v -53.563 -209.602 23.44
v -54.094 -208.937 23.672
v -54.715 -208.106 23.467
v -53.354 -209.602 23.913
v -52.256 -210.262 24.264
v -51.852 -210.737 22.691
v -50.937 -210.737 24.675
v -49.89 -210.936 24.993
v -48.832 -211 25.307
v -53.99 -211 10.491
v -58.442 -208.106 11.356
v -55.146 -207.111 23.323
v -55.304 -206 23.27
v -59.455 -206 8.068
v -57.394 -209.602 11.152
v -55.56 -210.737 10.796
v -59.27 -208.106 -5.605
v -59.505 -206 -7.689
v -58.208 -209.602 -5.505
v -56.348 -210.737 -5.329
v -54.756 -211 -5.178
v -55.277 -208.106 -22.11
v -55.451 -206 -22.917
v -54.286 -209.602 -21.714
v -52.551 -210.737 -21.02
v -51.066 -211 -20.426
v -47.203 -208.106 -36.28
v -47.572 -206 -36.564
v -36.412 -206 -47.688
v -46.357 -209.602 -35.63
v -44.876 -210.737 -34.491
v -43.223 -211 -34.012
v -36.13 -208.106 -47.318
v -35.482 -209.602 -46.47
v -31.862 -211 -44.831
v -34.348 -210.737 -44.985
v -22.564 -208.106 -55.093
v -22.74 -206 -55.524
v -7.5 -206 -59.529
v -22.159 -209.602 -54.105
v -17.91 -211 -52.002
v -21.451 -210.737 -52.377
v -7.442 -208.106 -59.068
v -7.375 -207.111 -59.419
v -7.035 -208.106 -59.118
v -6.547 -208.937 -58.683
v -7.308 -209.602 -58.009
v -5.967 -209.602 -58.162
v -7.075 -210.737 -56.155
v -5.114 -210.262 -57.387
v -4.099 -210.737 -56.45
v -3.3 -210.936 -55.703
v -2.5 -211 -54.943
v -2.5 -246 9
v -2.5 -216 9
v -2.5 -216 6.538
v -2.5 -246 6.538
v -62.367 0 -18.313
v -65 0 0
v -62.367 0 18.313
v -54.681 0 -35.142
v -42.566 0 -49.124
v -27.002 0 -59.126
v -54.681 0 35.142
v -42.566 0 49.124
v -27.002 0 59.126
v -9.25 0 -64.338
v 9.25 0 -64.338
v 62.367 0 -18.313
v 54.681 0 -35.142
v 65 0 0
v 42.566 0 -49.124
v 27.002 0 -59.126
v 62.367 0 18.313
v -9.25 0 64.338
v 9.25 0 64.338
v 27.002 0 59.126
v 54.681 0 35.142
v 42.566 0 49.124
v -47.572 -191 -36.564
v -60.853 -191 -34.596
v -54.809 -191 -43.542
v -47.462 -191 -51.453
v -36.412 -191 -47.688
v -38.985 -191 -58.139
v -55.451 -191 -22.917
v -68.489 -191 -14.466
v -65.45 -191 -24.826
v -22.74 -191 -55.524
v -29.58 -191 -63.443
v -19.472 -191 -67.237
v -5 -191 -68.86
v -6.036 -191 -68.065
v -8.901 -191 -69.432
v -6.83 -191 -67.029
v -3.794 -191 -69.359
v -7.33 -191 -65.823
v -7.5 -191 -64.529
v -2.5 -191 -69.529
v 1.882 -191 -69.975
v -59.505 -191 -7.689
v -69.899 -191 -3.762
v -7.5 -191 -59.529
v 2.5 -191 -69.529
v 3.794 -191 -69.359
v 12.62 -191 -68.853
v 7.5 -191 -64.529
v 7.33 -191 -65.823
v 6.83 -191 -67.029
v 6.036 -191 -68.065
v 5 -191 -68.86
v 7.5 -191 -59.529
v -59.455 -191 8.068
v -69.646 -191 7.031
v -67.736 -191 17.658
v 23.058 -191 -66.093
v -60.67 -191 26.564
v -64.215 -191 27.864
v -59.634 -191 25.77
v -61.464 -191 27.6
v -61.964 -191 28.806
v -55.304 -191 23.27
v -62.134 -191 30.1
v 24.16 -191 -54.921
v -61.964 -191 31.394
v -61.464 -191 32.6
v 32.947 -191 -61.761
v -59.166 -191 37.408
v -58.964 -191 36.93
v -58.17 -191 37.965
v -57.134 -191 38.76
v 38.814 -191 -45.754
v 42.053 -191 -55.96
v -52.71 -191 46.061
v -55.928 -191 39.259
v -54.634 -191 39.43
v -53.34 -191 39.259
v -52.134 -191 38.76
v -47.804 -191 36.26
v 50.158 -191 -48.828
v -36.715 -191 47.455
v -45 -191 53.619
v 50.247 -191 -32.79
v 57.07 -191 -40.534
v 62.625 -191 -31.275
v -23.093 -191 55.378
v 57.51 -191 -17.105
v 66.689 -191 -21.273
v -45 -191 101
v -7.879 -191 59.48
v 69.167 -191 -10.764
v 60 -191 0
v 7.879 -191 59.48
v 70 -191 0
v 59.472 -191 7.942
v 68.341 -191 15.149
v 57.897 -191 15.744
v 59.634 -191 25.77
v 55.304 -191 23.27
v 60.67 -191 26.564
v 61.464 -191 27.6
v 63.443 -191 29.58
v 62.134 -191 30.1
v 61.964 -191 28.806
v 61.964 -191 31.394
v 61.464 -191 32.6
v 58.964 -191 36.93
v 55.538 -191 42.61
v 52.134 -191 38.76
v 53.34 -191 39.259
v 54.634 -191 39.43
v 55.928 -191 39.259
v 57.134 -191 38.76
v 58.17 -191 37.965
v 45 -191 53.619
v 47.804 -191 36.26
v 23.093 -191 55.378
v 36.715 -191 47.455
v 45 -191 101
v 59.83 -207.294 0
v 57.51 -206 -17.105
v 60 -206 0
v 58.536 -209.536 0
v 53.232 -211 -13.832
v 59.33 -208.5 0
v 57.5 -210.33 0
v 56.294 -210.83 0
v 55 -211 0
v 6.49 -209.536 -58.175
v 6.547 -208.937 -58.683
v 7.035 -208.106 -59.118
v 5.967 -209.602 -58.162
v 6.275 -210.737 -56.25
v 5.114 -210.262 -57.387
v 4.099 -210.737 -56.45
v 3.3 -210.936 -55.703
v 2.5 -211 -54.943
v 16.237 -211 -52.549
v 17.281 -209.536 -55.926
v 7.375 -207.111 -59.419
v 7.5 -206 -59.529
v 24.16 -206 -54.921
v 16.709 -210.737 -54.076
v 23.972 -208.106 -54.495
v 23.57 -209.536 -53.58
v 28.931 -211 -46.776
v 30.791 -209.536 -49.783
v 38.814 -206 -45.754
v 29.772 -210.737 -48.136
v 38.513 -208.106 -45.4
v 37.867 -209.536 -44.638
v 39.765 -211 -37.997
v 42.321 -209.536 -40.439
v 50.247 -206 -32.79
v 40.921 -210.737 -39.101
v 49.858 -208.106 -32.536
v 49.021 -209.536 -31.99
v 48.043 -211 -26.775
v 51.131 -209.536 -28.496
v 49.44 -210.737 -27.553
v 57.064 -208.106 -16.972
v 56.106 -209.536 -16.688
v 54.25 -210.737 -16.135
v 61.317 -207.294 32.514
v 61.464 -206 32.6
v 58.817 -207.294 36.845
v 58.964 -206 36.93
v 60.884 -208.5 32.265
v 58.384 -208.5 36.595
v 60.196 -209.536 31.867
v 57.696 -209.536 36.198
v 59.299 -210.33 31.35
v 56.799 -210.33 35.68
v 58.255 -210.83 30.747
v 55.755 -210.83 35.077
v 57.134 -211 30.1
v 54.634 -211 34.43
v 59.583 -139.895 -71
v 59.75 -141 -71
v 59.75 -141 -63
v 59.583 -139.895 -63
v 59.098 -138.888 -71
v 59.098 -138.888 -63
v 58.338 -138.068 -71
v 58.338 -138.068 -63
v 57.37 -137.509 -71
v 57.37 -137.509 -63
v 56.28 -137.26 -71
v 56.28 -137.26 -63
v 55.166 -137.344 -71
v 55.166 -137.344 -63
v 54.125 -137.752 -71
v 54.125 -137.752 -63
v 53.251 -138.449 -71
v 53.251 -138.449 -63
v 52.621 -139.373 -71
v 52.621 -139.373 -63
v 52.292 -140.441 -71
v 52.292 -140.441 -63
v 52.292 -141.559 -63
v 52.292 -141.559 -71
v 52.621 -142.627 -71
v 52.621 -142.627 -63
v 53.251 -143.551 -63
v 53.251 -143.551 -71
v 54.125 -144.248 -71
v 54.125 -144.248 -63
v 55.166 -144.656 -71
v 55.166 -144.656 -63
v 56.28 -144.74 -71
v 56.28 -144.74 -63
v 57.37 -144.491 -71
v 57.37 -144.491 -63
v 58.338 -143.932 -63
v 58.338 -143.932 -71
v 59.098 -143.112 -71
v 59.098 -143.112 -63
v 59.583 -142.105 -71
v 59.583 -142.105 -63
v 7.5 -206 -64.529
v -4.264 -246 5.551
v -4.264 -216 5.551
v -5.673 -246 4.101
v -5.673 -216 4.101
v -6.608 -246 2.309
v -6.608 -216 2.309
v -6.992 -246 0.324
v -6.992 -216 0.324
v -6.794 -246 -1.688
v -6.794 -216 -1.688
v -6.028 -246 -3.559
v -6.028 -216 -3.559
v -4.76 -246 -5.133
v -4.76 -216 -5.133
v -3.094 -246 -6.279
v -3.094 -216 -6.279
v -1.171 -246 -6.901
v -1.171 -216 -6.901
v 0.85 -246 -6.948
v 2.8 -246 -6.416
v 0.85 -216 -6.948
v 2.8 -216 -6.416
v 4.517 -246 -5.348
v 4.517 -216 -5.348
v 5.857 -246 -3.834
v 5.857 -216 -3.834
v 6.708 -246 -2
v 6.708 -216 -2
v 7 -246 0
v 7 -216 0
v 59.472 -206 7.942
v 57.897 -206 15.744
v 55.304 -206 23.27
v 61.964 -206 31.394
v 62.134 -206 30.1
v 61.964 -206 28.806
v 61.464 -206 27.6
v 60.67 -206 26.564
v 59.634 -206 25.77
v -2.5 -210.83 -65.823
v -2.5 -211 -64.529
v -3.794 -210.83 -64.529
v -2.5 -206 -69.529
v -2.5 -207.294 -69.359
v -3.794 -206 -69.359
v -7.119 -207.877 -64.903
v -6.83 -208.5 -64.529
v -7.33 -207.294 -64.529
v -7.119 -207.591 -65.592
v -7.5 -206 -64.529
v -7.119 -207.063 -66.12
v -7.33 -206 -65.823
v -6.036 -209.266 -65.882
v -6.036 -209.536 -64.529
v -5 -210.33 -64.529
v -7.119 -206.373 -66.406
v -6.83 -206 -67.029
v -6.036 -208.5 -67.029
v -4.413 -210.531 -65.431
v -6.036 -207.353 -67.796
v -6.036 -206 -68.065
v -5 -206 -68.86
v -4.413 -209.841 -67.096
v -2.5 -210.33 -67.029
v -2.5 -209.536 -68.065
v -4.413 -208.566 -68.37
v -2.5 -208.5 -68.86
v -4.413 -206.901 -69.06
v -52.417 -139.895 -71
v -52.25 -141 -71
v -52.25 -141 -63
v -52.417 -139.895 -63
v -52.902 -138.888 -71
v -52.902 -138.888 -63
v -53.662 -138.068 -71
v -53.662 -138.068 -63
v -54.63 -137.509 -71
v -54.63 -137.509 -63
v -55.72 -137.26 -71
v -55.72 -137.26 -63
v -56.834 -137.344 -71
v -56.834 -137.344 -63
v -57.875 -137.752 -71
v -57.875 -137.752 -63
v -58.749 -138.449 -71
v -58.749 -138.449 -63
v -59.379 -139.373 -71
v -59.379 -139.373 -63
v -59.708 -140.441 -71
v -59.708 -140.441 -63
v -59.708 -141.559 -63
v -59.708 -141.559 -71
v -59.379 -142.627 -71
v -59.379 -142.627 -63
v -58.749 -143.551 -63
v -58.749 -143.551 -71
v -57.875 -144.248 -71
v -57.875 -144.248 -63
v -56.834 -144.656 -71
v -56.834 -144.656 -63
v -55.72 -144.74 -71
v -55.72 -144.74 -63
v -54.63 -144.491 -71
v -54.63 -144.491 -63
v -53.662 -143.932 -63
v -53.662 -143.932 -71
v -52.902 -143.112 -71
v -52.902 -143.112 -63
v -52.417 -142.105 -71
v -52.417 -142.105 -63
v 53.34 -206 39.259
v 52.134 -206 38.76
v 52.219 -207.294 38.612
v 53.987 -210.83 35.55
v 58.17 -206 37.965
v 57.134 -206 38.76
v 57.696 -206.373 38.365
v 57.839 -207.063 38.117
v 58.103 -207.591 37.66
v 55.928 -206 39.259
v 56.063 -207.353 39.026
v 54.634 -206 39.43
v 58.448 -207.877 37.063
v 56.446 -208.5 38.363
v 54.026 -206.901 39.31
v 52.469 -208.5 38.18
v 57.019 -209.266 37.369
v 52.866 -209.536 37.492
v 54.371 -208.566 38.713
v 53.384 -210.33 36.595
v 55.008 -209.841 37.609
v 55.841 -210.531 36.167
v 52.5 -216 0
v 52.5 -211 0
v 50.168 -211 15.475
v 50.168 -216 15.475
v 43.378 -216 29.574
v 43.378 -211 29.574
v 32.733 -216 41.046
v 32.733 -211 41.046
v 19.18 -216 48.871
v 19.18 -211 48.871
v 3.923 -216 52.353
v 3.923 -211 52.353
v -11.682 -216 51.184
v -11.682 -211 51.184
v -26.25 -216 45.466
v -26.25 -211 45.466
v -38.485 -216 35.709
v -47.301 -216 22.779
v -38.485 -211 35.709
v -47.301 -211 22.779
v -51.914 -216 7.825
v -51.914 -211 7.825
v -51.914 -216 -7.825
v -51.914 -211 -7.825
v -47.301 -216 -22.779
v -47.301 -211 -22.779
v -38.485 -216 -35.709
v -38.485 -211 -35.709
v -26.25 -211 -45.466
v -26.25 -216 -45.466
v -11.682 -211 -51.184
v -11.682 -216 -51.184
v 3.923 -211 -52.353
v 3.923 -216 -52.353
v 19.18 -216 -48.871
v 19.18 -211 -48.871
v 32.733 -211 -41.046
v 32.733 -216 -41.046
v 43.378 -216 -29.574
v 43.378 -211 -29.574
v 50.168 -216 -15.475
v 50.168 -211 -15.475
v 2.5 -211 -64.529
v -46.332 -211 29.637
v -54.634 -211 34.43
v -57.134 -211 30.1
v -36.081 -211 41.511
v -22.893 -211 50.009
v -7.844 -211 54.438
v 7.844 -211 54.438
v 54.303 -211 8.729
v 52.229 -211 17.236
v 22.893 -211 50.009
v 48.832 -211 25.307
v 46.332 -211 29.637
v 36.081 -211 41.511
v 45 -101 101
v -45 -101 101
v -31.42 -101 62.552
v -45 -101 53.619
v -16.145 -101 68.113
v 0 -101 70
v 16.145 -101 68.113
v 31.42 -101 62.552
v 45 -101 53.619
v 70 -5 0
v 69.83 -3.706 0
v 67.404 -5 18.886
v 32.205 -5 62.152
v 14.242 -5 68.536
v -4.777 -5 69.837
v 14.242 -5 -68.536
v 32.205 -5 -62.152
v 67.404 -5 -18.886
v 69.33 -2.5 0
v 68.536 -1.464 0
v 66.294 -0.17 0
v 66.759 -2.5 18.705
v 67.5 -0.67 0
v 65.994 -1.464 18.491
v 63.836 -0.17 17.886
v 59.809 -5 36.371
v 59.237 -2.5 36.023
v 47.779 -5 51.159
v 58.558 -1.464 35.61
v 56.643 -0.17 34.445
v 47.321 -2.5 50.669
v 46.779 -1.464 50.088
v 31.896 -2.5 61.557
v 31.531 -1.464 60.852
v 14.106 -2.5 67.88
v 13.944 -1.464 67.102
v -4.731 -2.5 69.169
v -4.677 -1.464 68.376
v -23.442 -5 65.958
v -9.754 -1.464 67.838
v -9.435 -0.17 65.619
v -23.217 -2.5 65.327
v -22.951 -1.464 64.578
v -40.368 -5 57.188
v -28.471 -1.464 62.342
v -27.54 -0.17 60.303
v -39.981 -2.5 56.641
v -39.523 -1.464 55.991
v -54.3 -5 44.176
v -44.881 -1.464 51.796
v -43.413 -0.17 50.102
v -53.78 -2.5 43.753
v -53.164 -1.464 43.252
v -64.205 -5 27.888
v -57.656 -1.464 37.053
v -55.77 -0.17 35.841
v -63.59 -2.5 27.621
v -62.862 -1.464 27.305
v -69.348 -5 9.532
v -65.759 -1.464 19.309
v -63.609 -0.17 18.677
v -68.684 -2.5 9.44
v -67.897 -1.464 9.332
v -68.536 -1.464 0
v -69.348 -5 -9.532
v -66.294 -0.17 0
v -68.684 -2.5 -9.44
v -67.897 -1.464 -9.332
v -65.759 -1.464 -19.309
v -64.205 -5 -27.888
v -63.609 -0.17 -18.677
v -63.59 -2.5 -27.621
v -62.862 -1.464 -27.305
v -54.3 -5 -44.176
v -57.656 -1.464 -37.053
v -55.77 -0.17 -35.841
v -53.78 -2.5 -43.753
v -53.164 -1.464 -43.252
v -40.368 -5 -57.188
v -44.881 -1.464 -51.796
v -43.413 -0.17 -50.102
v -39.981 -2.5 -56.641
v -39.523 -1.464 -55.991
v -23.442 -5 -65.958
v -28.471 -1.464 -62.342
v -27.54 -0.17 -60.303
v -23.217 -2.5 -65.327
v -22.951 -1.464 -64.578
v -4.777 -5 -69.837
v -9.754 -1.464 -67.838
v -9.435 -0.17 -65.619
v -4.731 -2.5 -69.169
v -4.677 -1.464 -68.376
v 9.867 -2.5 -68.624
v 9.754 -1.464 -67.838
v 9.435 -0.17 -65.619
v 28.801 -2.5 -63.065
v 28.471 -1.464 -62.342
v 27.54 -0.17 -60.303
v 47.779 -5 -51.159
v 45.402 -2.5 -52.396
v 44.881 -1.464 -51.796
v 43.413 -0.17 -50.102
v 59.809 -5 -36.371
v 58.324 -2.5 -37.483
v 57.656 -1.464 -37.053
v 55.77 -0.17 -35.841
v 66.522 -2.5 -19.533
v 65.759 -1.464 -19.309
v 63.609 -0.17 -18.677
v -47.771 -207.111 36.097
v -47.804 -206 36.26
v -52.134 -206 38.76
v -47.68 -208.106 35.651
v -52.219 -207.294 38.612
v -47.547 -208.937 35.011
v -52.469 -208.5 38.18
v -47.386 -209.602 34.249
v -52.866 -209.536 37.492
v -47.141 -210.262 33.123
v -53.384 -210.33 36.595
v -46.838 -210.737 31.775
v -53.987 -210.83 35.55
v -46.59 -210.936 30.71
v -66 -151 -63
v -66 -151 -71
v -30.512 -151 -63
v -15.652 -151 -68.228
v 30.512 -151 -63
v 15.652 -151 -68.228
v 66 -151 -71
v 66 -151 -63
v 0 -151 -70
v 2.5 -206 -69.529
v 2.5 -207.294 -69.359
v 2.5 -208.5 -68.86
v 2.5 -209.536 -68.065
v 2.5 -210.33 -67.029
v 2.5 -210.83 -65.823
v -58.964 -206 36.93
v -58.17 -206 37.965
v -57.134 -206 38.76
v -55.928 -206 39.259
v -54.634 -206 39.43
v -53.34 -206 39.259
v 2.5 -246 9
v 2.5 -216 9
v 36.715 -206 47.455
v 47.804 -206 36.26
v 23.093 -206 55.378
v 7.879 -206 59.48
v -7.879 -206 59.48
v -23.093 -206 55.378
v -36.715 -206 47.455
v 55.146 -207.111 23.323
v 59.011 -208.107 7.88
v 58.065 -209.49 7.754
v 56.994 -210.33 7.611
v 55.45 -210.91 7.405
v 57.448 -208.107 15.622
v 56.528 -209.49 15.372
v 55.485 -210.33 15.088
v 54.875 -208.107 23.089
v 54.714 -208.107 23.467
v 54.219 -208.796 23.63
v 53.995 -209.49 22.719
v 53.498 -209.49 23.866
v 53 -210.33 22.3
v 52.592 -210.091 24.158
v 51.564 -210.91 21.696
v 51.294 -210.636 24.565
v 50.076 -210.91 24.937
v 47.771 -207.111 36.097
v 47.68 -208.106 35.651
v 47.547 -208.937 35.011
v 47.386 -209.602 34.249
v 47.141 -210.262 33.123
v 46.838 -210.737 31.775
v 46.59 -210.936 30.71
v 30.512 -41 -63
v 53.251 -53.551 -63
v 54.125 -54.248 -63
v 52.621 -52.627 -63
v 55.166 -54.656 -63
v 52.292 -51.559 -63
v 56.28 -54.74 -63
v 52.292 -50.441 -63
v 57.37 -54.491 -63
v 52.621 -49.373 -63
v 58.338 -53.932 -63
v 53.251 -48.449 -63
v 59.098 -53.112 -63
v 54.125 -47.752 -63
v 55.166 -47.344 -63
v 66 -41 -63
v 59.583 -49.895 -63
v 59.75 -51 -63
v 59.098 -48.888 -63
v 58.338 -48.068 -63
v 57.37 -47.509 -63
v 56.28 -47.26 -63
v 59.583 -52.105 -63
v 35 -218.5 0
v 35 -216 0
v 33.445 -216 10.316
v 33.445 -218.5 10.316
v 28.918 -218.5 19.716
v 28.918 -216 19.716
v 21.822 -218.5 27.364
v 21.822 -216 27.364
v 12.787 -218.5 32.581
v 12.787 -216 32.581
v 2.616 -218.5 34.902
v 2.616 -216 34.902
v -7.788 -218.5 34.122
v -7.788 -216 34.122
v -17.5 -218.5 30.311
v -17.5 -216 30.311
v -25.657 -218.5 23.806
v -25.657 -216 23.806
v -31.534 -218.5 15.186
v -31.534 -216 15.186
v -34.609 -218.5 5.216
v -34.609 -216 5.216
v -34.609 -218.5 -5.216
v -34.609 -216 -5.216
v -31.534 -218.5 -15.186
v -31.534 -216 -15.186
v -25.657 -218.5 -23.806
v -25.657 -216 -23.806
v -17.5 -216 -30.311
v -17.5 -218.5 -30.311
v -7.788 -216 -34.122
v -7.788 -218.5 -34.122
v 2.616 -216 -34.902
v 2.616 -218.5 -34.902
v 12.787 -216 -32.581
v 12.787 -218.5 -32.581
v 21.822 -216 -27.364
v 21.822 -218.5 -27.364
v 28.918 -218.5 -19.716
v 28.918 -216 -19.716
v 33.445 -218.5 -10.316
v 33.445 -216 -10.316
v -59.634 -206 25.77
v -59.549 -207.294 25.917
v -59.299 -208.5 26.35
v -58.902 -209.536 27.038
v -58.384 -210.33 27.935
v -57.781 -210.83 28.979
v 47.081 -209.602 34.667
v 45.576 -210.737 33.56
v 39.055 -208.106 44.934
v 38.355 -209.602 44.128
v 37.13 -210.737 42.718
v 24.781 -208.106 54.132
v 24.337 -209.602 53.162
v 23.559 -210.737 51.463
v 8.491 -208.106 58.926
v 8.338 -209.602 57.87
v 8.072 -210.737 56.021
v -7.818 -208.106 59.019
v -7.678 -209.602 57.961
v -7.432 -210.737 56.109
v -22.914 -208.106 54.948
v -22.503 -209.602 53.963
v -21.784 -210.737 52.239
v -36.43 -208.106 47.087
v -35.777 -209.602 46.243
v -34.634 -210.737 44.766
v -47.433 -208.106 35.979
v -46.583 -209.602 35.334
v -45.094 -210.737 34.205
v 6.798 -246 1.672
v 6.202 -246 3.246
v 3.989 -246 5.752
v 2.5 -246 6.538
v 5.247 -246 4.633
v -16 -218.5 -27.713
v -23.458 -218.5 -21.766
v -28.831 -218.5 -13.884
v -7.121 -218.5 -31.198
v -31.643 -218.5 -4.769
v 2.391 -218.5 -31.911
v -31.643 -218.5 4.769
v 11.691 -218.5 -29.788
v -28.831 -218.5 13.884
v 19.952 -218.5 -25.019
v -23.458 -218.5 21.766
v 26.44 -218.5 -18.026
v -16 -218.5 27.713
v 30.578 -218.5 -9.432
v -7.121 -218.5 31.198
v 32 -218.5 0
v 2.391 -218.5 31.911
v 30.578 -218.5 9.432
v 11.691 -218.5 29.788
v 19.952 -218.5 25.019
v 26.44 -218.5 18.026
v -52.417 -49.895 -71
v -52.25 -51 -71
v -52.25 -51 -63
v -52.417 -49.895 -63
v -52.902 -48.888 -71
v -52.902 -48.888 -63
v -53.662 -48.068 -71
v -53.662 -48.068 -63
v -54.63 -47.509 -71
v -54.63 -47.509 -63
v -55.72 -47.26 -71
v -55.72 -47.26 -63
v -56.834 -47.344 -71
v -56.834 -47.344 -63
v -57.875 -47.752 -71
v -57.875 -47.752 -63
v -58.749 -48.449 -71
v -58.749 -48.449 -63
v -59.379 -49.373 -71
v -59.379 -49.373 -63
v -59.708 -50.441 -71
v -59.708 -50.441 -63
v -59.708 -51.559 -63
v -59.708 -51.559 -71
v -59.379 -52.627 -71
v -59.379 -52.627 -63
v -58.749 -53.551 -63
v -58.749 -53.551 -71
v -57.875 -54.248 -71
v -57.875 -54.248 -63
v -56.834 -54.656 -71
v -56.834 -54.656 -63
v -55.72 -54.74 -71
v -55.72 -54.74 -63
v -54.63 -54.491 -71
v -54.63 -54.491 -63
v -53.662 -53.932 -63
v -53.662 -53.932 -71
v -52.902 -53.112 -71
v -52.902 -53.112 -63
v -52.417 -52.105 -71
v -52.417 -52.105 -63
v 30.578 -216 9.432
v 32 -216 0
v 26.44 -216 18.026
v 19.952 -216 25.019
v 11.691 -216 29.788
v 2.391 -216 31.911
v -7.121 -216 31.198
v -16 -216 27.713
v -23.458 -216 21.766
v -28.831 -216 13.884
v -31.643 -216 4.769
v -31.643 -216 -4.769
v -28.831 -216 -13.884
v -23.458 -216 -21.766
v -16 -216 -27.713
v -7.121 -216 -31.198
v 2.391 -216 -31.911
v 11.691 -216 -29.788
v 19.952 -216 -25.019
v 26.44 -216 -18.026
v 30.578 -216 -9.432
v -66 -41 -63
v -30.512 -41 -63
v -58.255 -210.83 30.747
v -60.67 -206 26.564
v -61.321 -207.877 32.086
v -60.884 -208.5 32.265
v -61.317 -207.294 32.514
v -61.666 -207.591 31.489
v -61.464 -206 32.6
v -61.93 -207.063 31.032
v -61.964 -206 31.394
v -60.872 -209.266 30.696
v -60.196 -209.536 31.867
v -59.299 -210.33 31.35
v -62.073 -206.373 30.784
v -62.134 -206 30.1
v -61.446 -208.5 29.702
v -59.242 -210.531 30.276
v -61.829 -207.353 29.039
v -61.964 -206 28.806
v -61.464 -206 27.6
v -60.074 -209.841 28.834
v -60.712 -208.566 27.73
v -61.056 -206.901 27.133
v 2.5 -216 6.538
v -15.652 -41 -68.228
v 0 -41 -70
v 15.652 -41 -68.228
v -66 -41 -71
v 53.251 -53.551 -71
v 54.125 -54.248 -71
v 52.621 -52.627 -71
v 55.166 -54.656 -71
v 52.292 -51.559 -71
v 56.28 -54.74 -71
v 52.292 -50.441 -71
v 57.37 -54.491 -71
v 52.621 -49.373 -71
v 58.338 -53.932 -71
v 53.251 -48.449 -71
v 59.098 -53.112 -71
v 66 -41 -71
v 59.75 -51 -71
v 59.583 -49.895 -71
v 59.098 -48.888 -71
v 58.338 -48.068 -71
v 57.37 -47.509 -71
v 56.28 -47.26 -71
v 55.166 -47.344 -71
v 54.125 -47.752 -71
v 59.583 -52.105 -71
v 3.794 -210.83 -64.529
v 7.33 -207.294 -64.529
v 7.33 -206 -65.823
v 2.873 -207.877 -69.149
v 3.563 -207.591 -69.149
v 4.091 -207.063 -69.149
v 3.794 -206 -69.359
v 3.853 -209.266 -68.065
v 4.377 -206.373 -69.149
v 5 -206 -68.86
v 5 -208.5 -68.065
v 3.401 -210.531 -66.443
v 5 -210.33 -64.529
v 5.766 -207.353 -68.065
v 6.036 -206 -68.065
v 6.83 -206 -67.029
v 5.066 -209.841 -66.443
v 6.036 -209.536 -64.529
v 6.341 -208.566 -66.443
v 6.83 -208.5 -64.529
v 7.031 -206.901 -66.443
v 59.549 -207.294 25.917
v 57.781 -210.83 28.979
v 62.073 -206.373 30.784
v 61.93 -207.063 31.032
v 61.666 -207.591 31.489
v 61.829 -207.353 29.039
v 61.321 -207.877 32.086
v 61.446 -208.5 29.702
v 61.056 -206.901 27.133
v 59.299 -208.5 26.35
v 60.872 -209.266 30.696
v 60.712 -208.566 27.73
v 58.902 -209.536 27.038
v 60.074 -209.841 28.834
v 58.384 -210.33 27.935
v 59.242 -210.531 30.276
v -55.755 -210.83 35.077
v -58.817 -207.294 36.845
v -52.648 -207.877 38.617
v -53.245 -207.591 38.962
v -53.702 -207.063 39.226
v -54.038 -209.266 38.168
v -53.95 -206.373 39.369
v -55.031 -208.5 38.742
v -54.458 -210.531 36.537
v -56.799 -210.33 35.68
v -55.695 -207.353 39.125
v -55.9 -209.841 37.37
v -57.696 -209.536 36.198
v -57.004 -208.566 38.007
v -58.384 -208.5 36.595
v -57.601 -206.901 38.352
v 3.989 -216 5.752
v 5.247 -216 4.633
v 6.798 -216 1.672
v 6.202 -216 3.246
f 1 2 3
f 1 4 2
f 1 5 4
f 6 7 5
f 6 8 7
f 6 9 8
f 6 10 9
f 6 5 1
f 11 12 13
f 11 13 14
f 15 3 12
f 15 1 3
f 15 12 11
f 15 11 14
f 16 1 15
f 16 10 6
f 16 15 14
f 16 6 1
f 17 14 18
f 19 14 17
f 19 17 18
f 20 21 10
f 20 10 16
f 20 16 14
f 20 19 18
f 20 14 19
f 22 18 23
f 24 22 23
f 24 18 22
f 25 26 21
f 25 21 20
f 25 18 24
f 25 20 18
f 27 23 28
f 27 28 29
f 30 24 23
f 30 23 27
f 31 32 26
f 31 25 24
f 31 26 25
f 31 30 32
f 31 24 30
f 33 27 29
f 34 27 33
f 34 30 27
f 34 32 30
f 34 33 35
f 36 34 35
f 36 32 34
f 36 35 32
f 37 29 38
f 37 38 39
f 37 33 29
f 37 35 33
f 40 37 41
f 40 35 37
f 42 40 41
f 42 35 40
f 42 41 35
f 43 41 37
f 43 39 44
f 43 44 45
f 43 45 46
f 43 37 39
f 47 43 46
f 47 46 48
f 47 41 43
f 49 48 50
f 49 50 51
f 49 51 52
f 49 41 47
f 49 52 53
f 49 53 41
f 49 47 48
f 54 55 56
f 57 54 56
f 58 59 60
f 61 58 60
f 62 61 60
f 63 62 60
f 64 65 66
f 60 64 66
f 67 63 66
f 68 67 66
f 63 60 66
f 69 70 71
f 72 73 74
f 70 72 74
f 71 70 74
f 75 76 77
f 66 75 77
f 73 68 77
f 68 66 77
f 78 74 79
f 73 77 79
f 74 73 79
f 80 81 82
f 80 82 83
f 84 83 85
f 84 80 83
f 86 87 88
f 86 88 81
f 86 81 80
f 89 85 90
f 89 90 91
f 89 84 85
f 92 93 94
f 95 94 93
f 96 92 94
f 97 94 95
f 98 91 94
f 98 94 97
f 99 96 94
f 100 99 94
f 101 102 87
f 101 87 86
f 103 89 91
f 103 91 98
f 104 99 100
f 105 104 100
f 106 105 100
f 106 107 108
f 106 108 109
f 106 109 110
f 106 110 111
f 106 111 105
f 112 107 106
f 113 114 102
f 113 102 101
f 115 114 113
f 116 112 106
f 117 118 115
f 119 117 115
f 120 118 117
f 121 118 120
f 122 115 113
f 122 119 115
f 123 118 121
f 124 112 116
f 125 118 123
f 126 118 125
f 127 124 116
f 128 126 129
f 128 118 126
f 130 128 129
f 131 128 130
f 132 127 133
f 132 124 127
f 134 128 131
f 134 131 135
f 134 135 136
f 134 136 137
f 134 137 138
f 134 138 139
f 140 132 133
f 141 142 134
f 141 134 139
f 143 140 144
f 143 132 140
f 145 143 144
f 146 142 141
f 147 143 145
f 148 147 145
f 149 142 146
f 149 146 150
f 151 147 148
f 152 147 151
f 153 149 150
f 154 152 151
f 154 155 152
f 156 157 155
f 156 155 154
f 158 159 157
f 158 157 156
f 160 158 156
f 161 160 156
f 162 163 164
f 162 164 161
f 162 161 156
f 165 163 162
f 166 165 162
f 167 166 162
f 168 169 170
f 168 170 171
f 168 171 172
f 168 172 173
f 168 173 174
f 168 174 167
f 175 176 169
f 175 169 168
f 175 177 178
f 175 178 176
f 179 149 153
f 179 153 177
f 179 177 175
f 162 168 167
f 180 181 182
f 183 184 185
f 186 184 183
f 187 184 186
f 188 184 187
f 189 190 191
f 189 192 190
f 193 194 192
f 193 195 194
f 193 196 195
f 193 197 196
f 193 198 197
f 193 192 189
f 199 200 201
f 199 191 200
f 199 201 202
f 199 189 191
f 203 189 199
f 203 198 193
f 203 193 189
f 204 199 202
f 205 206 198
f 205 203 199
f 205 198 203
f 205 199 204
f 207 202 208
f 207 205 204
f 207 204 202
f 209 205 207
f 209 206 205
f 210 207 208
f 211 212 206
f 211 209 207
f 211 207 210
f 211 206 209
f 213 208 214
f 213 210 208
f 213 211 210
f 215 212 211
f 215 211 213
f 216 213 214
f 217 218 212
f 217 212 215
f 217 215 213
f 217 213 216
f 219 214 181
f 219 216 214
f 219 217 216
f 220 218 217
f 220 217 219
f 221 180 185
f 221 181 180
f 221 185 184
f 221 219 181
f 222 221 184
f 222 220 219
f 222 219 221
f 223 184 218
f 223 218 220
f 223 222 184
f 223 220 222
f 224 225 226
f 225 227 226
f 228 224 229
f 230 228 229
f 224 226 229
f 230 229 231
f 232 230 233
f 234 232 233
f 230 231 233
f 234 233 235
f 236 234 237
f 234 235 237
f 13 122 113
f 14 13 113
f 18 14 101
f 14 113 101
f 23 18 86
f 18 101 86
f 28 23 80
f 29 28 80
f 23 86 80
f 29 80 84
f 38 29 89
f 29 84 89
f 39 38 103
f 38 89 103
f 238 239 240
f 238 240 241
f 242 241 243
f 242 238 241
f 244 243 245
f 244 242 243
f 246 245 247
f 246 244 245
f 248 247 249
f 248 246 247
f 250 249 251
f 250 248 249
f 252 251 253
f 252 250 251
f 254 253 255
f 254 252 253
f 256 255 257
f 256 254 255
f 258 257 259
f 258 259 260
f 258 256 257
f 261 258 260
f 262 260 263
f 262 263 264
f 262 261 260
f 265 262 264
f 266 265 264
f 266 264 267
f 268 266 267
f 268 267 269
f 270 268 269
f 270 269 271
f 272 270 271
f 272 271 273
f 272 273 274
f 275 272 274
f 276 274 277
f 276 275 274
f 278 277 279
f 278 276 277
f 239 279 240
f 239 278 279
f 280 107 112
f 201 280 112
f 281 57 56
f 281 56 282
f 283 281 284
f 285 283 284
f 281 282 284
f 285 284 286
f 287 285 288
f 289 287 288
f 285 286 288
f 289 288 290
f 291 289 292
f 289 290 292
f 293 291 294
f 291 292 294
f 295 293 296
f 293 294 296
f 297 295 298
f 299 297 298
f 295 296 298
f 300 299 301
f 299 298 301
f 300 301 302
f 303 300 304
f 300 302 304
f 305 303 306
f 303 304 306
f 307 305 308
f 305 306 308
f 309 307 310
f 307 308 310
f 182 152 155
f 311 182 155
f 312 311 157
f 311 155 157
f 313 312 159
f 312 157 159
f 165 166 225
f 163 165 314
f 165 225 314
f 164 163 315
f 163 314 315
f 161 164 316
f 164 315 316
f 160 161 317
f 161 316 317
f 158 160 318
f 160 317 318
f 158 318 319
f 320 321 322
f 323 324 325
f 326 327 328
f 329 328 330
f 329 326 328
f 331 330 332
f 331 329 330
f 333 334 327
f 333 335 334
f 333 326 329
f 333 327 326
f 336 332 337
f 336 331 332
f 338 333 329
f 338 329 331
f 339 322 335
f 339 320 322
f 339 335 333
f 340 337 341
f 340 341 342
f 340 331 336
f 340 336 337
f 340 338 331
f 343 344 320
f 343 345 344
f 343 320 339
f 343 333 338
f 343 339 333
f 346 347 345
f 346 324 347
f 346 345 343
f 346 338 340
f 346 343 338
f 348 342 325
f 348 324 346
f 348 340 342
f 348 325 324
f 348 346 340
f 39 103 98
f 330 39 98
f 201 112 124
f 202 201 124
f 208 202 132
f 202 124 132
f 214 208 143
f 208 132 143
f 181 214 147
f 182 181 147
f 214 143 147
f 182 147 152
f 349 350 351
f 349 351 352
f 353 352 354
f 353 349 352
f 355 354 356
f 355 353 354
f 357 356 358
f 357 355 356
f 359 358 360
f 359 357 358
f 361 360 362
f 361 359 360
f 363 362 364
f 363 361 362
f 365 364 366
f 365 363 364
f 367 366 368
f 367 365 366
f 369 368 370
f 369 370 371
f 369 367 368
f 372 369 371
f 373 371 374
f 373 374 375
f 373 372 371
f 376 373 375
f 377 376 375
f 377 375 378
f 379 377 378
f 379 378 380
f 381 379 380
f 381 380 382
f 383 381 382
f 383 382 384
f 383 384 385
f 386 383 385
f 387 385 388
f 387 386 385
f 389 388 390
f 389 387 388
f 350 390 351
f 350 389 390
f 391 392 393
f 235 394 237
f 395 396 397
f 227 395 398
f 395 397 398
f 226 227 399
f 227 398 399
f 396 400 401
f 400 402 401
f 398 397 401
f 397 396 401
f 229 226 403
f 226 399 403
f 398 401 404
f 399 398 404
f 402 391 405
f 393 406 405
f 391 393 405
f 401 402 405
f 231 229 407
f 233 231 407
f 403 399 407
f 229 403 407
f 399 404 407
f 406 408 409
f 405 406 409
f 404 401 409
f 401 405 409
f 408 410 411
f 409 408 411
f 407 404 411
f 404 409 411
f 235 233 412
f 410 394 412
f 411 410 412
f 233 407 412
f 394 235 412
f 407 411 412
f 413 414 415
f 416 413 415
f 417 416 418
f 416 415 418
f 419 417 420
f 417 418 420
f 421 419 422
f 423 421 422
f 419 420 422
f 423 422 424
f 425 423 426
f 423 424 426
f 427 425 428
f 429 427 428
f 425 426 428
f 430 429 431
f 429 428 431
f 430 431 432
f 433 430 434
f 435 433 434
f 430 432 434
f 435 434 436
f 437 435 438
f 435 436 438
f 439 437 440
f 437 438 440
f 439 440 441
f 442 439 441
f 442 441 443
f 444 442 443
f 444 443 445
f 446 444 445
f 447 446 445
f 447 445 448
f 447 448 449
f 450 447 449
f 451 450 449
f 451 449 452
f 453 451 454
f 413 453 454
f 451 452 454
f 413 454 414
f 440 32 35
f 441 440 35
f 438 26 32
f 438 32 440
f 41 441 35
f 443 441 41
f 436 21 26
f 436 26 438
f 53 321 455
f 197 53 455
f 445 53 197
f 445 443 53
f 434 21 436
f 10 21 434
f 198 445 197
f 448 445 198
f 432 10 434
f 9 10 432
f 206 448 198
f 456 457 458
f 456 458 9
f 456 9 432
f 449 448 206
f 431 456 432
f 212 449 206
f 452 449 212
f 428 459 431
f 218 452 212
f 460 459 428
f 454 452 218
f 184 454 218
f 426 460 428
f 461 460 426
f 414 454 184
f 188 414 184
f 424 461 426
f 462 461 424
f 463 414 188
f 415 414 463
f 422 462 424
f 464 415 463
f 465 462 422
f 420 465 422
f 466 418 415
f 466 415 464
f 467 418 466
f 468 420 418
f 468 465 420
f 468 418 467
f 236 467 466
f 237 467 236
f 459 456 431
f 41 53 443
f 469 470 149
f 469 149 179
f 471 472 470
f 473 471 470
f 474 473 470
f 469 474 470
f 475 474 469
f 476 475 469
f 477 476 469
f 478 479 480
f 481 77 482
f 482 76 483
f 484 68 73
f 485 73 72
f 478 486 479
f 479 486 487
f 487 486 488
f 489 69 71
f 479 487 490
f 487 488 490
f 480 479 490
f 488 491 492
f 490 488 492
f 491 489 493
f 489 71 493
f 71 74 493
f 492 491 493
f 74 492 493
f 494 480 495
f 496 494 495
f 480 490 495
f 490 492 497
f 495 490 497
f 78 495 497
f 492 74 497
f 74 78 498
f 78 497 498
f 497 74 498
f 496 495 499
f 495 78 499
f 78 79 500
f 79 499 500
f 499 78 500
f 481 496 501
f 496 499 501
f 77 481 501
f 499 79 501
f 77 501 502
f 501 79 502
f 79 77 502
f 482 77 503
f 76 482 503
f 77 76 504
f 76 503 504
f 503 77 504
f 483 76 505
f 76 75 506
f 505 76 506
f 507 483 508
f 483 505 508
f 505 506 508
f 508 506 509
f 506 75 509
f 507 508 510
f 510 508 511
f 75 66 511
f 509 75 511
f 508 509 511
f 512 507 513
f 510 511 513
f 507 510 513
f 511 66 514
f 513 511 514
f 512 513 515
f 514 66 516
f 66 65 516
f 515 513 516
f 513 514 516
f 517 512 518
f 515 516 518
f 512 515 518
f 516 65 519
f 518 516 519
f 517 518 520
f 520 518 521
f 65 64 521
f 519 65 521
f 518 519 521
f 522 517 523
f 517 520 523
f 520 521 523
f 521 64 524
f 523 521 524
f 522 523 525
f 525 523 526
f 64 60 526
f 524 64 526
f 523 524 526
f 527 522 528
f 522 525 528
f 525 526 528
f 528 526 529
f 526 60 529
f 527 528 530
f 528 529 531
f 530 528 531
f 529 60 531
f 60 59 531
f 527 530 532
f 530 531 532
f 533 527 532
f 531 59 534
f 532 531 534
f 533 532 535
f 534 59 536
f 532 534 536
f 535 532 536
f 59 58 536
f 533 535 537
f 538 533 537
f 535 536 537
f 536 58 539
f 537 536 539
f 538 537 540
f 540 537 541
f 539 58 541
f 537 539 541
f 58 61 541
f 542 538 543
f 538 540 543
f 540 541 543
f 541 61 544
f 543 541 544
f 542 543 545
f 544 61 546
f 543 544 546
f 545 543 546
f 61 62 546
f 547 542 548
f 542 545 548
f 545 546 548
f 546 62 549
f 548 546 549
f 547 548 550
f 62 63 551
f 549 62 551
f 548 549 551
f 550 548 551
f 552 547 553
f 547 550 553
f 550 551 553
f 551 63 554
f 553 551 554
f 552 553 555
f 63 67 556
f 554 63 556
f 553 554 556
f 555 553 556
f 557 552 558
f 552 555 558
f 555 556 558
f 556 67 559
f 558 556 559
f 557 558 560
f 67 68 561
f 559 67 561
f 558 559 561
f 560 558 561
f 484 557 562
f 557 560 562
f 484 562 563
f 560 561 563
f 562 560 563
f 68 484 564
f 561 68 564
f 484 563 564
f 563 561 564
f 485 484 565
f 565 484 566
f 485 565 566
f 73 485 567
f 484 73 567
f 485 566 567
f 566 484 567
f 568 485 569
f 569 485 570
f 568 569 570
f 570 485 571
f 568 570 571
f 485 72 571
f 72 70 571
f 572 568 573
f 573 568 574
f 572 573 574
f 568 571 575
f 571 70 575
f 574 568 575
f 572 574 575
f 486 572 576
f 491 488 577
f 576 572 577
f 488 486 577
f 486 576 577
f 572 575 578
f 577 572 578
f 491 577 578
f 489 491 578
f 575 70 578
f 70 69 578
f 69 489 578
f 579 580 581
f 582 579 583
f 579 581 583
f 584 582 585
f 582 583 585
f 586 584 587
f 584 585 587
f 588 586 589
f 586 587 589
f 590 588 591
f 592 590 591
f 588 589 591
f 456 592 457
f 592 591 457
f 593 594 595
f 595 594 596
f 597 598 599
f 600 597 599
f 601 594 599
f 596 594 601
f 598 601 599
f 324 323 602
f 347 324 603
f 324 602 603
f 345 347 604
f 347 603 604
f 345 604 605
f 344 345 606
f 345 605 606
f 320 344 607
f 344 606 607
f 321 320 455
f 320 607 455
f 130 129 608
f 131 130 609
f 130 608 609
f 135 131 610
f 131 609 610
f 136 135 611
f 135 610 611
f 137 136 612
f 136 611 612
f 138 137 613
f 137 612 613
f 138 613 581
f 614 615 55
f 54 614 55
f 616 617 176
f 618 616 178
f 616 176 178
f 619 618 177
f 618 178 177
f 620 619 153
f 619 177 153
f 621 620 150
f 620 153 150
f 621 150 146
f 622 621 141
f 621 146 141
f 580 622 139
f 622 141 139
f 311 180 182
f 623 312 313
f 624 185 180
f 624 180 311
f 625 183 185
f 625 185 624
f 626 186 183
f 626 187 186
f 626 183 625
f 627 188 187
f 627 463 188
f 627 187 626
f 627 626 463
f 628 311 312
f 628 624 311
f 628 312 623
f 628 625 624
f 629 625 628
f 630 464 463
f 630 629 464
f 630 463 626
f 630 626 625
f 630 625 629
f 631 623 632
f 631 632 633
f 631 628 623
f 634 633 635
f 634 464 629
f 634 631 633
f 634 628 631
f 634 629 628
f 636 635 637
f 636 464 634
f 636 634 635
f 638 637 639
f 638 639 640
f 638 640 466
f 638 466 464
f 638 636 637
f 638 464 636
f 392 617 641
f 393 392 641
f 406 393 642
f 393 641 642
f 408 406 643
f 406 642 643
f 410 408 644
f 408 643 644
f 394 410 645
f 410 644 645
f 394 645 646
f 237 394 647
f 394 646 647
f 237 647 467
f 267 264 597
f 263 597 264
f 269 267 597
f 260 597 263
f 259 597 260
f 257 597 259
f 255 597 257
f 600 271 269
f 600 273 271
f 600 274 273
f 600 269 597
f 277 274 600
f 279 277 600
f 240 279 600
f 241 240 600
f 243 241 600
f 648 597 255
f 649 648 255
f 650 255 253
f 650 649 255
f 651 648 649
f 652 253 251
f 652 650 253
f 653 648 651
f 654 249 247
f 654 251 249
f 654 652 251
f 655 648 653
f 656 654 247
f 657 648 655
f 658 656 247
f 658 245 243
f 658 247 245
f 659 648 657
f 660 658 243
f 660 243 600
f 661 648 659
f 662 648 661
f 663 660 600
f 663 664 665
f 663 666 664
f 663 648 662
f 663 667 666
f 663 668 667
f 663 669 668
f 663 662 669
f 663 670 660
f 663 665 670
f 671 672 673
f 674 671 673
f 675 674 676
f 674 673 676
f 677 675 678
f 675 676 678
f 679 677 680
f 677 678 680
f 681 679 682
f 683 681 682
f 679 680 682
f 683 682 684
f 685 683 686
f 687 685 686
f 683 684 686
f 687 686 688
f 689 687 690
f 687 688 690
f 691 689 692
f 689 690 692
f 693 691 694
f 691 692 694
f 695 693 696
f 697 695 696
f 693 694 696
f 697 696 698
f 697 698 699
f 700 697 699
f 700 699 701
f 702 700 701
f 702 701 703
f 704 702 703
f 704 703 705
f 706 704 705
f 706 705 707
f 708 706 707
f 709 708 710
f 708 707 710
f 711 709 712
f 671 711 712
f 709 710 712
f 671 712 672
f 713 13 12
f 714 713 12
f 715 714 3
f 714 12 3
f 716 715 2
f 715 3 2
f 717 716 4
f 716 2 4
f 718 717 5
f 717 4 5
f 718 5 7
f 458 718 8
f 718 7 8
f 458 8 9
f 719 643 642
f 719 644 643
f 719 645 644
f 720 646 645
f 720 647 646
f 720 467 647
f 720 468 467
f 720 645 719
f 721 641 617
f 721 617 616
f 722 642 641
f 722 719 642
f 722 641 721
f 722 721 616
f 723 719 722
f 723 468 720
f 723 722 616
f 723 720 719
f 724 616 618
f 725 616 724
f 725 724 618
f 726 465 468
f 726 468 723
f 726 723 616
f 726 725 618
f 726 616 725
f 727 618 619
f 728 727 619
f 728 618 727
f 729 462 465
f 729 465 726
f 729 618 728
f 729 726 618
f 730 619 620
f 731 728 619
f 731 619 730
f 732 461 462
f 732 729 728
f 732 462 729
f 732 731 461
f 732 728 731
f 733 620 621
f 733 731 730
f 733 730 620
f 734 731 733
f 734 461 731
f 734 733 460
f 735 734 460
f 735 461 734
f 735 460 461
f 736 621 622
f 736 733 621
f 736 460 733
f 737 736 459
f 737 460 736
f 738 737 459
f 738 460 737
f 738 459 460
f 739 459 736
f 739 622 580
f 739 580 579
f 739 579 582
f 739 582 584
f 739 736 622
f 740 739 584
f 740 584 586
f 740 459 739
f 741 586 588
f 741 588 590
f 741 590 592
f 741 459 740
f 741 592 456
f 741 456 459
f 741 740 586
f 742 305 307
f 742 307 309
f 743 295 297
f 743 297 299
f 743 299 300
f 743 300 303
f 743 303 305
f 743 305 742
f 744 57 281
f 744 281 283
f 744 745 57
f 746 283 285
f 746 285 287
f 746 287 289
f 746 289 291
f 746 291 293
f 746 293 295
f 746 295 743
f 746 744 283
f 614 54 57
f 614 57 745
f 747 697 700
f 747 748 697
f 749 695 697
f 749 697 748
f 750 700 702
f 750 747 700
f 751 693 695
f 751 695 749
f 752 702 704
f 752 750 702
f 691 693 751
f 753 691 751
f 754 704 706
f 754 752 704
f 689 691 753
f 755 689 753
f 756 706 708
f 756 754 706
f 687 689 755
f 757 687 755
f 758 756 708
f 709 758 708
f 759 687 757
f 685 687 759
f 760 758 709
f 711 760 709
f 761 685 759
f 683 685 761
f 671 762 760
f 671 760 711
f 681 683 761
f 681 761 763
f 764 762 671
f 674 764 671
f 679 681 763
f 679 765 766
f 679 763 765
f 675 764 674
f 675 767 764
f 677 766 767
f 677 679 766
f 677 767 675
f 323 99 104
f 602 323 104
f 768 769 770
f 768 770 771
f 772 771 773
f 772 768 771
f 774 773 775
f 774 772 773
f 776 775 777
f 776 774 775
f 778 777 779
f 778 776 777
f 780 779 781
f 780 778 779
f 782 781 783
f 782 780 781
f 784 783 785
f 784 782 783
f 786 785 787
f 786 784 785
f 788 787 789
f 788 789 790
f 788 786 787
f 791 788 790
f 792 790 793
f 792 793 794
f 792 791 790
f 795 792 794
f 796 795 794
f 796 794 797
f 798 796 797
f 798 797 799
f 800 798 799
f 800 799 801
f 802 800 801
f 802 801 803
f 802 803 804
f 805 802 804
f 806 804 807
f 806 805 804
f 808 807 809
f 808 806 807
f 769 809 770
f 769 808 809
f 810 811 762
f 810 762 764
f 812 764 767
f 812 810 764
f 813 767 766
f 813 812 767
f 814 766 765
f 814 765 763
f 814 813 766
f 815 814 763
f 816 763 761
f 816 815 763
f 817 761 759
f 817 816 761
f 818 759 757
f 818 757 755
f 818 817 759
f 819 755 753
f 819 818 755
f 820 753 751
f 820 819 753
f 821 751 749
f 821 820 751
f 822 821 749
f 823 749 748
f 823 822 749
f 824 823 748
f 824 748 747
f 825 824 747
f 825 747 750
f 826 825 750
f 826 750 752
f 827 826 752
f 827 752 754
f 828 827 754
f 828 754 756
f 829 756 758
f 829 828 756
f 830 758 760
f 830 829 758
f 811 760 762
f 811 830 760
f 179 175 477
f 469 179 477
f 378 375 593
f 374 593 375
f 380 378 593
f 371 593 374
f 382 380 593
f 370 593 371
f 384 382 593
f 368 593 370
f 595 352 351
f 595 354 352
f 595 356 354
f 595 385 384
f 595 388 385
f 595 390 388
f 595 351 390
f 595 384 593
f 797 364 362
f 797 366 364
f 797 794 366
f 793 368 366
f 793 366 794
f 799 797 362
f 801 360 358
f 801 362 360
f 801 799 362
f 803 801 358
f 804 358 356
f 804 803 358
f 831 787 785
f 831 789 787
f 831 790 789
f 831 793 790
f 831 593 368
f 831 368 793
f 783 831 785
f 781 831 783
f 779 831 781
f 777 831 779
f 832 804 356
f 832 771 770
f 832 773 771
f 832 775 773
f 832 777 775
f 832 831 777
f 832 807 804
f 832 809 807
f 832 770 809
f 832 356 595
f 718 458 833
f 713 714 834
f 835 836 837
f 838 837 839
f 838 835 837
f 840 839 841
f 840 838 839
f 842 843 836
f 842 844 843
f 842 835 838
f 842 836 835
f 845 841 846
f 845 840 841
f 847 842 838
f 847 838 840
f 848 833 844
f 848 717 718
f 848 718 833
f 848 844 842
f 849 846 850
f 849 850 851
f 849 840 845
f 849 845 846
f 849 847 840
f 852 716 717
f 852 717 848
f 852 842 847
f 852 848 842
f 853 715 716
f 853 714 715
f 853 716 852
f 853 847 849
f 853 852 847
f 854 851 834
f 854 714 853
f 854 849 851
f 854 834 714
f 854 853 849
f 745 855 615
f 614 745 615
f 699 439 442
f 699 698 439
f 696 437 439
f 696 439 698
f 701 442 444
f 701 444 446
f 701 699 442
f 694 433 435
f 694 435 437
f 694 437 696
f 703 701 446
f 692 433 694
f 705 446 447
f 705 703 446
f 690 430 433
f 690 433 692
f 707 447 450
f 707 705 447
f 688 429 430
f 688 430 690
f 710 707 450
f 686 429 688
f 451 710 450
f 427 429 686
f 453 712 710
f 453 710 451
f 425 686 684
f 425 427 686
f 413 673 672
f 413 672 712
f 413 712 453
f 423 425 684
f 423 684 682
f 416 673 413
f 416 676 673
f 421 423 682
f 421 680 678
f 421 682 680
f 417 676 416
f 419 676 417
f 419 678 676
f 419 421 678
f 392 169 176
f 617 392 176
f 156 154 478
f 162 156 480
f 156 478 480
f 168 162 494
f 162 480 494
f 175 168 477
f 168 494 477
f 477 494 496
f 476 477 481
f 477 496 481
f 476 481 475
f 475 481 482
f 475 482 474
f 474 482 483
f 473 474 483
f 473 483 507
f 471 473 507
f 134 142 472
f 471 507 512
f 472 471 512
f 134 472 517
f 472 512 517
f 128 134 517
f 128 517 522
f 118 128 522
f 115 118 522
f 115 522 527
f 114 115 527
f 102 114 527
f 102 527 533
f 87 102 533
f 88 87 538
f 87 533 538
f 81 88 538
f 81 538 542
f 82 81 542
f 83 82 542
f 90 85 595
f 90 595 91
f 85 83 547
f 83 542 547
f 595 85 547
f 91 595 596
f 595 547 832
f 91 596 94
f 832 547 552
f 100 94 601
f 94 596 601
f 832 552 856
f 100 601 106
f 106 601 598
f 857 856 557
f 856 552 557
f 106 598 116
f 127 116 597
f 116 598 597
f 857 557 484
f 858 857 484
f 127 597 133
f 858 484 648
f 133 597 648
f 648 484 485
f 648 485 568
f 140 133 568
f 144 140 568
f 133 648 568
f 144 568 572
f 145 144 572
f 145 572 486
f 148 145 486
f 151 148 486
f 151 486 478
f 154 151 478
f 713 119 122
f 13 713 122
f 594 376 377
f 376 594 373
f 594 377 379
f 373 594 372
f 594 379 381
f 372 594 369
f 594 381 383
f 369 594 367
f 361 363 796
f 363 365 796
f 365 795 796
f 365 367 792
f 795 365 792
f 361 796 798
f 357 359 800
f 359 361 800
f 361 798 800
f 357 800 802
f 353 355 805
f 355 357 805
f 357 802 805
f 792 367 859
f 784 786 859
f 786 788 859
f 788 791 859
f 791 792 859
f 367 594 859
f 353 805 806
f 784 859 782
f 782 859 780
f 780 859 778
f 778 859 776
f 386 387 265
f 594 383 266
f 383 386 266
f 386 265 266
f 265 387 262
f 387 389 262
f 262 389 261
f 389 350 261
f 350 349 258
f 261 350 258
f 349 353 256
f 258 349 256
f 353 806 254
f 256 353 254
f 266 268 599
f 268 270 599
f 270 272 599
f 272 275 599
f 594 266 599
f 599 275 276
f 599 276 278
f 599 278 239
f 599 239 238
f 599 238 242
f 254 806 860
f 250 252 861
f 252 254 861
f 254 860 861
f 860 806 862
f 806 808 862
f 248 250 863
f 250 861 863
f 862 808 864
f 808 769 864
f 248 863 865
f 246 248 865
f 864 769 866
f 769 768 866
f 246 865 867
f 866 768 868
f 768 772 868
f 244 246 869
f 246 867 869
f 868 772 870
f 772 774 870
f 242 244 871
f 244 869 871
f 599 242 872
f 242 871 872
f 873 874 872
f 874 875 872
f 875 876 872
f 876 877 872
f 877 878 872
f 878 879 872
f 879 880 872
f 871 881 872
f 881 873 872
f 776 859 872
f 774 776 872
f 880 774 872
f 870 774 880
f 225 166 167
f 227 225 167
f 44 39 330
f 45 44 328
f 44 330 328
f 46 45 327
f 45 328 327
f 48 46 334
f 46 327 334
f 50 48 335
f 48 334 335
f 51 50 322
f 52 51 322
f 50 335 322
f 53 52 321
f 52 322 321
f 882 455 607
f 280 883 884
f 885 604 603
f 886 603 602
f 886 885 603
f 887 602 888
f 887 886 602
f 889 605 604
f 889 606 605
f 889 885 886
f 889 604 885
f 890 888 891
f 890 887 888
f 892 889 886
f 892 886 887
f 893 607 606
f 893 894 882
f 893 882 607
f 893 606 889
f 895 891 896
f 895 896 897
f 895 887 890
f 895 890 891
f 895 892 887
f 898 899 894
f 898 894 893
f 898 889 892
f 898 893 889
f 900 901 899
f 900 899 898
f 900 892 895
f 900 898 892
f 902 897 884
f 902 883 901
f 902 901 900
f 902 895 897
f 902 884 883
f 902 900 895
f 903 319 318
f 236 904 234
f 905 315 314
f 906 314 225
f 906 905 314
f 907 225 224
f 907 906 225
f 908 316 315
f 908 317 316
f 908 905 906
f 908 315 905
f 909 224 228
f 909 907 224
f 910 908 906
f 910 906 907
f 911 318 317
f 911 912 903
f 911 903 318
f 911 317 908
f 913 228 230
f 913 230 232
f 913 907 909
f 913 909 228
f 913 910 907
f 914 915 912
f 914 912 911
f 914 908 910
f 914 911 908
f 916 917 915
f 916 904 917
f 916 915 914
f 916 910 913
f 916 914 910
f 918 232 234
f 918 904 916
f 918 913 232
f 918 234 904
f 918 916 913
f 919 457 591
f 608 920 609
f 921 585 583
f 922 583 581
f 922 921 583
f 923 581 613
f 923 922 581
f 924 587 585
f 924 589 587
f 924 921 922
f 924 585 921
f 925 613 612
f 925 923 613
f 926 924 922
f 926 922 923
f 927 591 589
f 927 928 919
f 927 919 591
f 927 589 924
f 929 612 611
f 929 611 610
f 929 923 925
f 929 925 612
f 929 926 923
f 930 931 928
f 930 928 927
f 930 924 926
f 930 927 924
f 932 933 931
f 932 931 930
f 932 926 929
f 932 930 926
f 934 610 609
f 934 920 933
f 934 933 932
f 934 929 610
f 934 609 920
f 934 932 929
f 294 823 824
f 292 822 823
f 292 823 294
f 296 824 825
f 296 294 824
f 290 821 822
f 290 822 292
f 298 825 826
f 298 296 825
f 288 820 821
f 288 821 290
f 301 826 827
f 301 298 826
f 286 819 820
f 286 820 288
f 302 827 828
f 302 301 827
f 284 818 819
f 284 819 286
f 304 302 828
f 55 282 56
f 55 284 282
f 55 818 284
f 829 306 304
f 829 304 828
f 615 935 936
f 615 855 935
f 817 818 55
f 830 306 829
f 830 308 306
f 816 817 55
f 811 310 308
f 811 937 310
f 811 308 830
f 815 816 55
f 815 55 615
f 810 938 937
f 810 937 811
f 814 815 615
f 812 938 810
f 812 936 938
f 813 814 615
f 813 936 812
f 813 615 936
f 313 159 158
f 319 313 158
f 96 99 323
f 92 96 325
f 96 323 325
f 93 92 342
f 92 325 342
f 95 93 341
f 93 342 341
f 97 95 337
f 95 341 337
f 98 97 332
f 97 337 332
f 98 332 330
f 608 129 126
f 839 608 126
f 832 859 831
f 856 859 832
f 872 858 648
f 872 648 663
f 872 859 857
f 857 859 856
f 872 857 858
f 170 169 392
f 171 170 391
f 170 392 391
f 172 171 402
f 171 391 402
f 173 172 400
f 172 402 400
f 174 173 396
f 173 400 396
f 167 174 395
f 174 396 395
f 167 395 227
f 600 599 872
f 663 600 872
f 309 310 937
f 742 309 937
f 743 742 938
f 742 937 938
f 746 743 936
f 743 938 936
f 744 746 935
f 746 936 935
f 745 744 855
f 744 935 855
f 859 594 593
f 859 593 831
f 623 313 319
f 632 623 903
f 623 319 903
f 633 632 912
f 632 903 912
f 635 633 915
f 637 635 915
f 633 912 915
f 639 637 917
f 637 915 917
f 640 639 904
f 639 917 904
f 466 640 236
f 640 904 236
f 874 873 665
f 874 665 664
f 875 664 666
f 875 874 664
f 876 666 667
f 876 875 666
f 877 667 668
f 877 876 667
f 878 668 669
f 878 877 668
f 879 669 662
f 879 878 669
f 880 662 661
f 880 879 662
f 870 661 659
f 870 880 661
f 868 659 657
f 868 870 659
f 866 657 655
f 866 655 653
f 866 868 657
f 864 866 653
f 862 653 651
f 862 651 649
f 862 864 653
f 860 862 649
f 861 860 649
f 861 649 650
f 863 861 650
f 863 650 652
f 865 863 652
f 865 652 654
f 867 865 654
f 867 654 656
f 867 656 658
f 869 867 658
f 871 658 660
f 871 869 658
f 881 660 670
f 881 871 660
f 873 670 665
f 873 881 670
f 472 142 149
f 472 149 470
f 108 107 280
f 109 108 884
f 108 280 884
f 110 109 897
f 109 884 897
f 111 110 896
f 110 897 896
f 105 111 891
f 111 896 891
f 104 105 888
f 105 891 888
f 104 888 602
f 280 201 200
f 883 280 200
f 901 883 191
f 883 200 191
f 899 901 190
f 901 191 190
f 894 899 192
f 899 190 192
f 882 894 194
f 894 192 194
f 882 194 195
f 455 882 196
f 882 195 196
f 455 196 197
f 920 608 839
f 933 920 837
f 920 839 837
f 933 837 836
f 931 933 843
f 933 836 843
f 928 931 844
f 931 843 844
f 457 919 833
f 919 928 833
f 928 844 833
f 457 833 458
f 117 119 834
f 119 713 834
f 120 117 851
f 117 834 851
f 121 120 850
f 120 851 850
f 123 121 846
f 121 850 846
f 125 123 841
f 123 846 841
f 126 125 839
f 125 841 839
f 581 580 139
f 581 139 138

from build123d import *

# Parameters (mm, degrees)
F0_R      = 70
F1_DEPTH  = 191
F3_DEPTH  = 20
F4_R      = 52.5
F5_DEPTH  = 5
F6_R      = 35
F6_R_2    = 32
F7_DEPTH  = 2.5
F9_DEPTH  = 30
F10_W     = 90
F10_H     = 90
F11_DEPTH = 101
F13_W     = 132
F13_H     = 110
F13_R     = 3.75
F14_DEPTH = 8
F15_R     = 5


with BuildPart() as f1:
    # F0 (on Front) → F1 (new body)
    with BuildSketch(Plane.XZ):
        Circle(F0_R)
    extrude(amount=F1_DEPTH)

    # F2 (on face) → F3 (join)
    with BuildSketch(Plane.XZ.offset(191)):
        with BuildLine():
            ThreePointArc((7.5, -59.529404499), (45, -39.686269666), (60, 0))
            ThreePointArc((60, 0), (58.8142780033, 11.8693177122), (55.3039765683, 23.2695117211))
            Line((55.3039765683, 23.2695117211), (47.8039765683, 36.2598927779))
            ThreePointArc((47.8039765683, 36.2598927779), (0, 60), (-47.8039765683, 36.2598927779))
            Line((-47.8039765683, 36.2598927779), (-55.3039765683, 23.2695117211))
            ThreePointArc((-55.3039765683, 23.2695117211), (-51.9615242271, -30), (-7.5, -59.529404499))
            Line((-7.5, -59.529404499), (7.5, -59.529404499))
        make_face()
        with BuildLine():
            Line((47.8039765683, 36.2598927779), (55.3039765683, 23.2695117211))
            ThreePointArc((55.3039765683, 23.2695117211), (51.9615242271, 30), (47.8039765683, 36.2598927779))
        make_face()
        with BuildLine():
            ThreePointArc((47.8039765683, 36.2598927779), (51.9615242271, 30), (55.3039765683, 23.2695117211))
            Line((55.3039765683, 23.2695117211), (63.9642306061, 28.2695117211))
            Line((63.9642306061, 28.2695117211), (56.4642306061, 41.2598927779))
            Line((56.4642306061, 41.2598927779), (47.8039765683, 36.2598927779))
        make_face()
        with BuildLine():
            Line((7.5, -69.529404499), (7.5, -59.529404499))
            ThreePointArc((7.5, -59.529404499), (0, -60), (-7.5, -59.529404499))
            Line((-7.5, -59.529404499), (-7.5, -69.529404499))
            Line((-7.5, -69.529404499), (7.5, -69.529404499))
        make_face()
        with BuildLine():
            ThreePointArc((-7.5, -59.529404499), (0, -60), (7.5, -59.529404499))
            Line((7.5, -59.529404499), (-7.5, -59.529404499))
        make_face()
        with BuildLine():
            Line((-55.3039765683, 23.2695117211), (-47.8039765683, 36.2598927779))
            ThreePointArc((-47.8039765683, 36.2598927779), (-51.9615242271, 30), (-55.3039765683, 23.2695117211))
        make_face()
        with BuildLine():
            ThreePointArc((-55.3039765683, 23.2695117211), (-51.9615242271, 30), (-47.8039765683, 36.2598927779))
            Line((-47.8039765683, 36.2598927779), (-56.4642306061, 41.2598927779))
            Line((-56.4642306061, 41.2598927779), (-63.9642306061, 28.2695117211))
            Line((-63.9642306061, 28.2695117211), (-55.3039765683, 23.2695117211))
        make_face()
    extrude(amount=F3_DEPTH)

    # F4 (on face) → F5 (join)
    with BuildSketch(Plane.XZ.offset(211)):
        Circle(F4_R)
    extrude(amount=F5_DEPTH)

    # F6 (on face) → F7 (join)
    with BuildSketch(Plane.XZ.offset(216)):
        Circle(F6_R)
        Circle(F6_R_2, mode=Mode.SUBTRACT)
    extrude(amount=F7_DEPTH)

    # F8 (on face) → F9 (join)
    with BuildSketch(Plane.XZ.offset(216)):
        with BuildLine():
            ThreePointArc((-2.5, 6.5383484153), (-3.9686269666, -5.7662812973), (7, 0))
            ThreePointArc((7, 0), (5.7662812973, 3.9686269666), (2.5, 6.5383484153))
            Line((2.5, 6.5383484153), (2.5, 4))
            Line((2.5, 4), (-2.5, 4))
            Line((-2.5, 4), (-2.5, 6.5383484153))
        make_face()
        with BuildLine():
            Line((2.5, 4), (2.5, 6.5383484153))
            ThreePointArc((2.5, 6.5383484153), (0, 7), (-2.5, 6.5383484153))
            Line((-2.5, 6.5383484153), (-2.5, 4))
            Line((-2.5, 4), (2.5, 4))
        make_face()
        with BuildLine():
            ThreePointArc((-2.5, 6.5383484153), (0, 7), (2.5, 6.5383484153))
            Line((2.5, 6.5383484153), (2.5, 9))
            Line((2.5, 9), (-2.5, 9))
            Line((-2.5, 9), (-2.5, 6.5383484153))
        make_face()
    extrude(amount=F9_DEPTH)

    # F10 (on Top) → F11 (join)
    with BuildSketch(Plane.XY):
        with Locations((0, -146)):
            Rectangle(F10_W, F10_H)
    extrude(amount=F11_DEPTH)

    # F13 (on offset) → F14 (join)
    with BuildSketch(Plane.XY.offset(-71)):
        with Locations((0, -96)):
            Rectangle(F13_W, F13_H)
        with Locations((-56, -141)):
            Circle(F13_R, mode=Mode.SUBTRACT)
        with Locations((56, -141)):
            Circle(F13_R, mode=Mode.SUBTRACT)
        with Locations((-56, -51)):
            Circle(F13_R, mode=Mode.SUBTRACT)
        with Locations((56, -51)):
            Circle(F13_R, mode=Mode.SUBTRACT)
    extrude(amount=F14_DEPTH)

    # F15
    f15_edges = [f1.edges().sort_by_distance(p)[0] for p in [
        (-70, 0, 0),
        (0, -211, 60),
        (52.134104, -211, 38.759893),
        (59.634104, -211, 25.769512),
        (-51.961524, -211, -30),
        (7.5, -211, -64.529404),
        (0, -211, -69.529404),
        (-7.5, -211, -64.529404),
        (51.961524, -211, -30),
        (-59.634104, -211, 25.769512),
        (-60.214231, -211, 34.764702),
        (-52.134104, -211, 38.759893),
        (-56.464231, -201, 41.259893),
        (-63.964231, -201, 28.269512),
        (56.464231, -201, 41.259893),
        (63.964231, -201, 28.269512),
        (7.5, -201, -69.529404),
        (-7.5, -201, -69.529404),
        (60.214231, -211, 34.764702),
    ]]
    fillet(f15_edges, radius=F15_R)


solid = f1.part
